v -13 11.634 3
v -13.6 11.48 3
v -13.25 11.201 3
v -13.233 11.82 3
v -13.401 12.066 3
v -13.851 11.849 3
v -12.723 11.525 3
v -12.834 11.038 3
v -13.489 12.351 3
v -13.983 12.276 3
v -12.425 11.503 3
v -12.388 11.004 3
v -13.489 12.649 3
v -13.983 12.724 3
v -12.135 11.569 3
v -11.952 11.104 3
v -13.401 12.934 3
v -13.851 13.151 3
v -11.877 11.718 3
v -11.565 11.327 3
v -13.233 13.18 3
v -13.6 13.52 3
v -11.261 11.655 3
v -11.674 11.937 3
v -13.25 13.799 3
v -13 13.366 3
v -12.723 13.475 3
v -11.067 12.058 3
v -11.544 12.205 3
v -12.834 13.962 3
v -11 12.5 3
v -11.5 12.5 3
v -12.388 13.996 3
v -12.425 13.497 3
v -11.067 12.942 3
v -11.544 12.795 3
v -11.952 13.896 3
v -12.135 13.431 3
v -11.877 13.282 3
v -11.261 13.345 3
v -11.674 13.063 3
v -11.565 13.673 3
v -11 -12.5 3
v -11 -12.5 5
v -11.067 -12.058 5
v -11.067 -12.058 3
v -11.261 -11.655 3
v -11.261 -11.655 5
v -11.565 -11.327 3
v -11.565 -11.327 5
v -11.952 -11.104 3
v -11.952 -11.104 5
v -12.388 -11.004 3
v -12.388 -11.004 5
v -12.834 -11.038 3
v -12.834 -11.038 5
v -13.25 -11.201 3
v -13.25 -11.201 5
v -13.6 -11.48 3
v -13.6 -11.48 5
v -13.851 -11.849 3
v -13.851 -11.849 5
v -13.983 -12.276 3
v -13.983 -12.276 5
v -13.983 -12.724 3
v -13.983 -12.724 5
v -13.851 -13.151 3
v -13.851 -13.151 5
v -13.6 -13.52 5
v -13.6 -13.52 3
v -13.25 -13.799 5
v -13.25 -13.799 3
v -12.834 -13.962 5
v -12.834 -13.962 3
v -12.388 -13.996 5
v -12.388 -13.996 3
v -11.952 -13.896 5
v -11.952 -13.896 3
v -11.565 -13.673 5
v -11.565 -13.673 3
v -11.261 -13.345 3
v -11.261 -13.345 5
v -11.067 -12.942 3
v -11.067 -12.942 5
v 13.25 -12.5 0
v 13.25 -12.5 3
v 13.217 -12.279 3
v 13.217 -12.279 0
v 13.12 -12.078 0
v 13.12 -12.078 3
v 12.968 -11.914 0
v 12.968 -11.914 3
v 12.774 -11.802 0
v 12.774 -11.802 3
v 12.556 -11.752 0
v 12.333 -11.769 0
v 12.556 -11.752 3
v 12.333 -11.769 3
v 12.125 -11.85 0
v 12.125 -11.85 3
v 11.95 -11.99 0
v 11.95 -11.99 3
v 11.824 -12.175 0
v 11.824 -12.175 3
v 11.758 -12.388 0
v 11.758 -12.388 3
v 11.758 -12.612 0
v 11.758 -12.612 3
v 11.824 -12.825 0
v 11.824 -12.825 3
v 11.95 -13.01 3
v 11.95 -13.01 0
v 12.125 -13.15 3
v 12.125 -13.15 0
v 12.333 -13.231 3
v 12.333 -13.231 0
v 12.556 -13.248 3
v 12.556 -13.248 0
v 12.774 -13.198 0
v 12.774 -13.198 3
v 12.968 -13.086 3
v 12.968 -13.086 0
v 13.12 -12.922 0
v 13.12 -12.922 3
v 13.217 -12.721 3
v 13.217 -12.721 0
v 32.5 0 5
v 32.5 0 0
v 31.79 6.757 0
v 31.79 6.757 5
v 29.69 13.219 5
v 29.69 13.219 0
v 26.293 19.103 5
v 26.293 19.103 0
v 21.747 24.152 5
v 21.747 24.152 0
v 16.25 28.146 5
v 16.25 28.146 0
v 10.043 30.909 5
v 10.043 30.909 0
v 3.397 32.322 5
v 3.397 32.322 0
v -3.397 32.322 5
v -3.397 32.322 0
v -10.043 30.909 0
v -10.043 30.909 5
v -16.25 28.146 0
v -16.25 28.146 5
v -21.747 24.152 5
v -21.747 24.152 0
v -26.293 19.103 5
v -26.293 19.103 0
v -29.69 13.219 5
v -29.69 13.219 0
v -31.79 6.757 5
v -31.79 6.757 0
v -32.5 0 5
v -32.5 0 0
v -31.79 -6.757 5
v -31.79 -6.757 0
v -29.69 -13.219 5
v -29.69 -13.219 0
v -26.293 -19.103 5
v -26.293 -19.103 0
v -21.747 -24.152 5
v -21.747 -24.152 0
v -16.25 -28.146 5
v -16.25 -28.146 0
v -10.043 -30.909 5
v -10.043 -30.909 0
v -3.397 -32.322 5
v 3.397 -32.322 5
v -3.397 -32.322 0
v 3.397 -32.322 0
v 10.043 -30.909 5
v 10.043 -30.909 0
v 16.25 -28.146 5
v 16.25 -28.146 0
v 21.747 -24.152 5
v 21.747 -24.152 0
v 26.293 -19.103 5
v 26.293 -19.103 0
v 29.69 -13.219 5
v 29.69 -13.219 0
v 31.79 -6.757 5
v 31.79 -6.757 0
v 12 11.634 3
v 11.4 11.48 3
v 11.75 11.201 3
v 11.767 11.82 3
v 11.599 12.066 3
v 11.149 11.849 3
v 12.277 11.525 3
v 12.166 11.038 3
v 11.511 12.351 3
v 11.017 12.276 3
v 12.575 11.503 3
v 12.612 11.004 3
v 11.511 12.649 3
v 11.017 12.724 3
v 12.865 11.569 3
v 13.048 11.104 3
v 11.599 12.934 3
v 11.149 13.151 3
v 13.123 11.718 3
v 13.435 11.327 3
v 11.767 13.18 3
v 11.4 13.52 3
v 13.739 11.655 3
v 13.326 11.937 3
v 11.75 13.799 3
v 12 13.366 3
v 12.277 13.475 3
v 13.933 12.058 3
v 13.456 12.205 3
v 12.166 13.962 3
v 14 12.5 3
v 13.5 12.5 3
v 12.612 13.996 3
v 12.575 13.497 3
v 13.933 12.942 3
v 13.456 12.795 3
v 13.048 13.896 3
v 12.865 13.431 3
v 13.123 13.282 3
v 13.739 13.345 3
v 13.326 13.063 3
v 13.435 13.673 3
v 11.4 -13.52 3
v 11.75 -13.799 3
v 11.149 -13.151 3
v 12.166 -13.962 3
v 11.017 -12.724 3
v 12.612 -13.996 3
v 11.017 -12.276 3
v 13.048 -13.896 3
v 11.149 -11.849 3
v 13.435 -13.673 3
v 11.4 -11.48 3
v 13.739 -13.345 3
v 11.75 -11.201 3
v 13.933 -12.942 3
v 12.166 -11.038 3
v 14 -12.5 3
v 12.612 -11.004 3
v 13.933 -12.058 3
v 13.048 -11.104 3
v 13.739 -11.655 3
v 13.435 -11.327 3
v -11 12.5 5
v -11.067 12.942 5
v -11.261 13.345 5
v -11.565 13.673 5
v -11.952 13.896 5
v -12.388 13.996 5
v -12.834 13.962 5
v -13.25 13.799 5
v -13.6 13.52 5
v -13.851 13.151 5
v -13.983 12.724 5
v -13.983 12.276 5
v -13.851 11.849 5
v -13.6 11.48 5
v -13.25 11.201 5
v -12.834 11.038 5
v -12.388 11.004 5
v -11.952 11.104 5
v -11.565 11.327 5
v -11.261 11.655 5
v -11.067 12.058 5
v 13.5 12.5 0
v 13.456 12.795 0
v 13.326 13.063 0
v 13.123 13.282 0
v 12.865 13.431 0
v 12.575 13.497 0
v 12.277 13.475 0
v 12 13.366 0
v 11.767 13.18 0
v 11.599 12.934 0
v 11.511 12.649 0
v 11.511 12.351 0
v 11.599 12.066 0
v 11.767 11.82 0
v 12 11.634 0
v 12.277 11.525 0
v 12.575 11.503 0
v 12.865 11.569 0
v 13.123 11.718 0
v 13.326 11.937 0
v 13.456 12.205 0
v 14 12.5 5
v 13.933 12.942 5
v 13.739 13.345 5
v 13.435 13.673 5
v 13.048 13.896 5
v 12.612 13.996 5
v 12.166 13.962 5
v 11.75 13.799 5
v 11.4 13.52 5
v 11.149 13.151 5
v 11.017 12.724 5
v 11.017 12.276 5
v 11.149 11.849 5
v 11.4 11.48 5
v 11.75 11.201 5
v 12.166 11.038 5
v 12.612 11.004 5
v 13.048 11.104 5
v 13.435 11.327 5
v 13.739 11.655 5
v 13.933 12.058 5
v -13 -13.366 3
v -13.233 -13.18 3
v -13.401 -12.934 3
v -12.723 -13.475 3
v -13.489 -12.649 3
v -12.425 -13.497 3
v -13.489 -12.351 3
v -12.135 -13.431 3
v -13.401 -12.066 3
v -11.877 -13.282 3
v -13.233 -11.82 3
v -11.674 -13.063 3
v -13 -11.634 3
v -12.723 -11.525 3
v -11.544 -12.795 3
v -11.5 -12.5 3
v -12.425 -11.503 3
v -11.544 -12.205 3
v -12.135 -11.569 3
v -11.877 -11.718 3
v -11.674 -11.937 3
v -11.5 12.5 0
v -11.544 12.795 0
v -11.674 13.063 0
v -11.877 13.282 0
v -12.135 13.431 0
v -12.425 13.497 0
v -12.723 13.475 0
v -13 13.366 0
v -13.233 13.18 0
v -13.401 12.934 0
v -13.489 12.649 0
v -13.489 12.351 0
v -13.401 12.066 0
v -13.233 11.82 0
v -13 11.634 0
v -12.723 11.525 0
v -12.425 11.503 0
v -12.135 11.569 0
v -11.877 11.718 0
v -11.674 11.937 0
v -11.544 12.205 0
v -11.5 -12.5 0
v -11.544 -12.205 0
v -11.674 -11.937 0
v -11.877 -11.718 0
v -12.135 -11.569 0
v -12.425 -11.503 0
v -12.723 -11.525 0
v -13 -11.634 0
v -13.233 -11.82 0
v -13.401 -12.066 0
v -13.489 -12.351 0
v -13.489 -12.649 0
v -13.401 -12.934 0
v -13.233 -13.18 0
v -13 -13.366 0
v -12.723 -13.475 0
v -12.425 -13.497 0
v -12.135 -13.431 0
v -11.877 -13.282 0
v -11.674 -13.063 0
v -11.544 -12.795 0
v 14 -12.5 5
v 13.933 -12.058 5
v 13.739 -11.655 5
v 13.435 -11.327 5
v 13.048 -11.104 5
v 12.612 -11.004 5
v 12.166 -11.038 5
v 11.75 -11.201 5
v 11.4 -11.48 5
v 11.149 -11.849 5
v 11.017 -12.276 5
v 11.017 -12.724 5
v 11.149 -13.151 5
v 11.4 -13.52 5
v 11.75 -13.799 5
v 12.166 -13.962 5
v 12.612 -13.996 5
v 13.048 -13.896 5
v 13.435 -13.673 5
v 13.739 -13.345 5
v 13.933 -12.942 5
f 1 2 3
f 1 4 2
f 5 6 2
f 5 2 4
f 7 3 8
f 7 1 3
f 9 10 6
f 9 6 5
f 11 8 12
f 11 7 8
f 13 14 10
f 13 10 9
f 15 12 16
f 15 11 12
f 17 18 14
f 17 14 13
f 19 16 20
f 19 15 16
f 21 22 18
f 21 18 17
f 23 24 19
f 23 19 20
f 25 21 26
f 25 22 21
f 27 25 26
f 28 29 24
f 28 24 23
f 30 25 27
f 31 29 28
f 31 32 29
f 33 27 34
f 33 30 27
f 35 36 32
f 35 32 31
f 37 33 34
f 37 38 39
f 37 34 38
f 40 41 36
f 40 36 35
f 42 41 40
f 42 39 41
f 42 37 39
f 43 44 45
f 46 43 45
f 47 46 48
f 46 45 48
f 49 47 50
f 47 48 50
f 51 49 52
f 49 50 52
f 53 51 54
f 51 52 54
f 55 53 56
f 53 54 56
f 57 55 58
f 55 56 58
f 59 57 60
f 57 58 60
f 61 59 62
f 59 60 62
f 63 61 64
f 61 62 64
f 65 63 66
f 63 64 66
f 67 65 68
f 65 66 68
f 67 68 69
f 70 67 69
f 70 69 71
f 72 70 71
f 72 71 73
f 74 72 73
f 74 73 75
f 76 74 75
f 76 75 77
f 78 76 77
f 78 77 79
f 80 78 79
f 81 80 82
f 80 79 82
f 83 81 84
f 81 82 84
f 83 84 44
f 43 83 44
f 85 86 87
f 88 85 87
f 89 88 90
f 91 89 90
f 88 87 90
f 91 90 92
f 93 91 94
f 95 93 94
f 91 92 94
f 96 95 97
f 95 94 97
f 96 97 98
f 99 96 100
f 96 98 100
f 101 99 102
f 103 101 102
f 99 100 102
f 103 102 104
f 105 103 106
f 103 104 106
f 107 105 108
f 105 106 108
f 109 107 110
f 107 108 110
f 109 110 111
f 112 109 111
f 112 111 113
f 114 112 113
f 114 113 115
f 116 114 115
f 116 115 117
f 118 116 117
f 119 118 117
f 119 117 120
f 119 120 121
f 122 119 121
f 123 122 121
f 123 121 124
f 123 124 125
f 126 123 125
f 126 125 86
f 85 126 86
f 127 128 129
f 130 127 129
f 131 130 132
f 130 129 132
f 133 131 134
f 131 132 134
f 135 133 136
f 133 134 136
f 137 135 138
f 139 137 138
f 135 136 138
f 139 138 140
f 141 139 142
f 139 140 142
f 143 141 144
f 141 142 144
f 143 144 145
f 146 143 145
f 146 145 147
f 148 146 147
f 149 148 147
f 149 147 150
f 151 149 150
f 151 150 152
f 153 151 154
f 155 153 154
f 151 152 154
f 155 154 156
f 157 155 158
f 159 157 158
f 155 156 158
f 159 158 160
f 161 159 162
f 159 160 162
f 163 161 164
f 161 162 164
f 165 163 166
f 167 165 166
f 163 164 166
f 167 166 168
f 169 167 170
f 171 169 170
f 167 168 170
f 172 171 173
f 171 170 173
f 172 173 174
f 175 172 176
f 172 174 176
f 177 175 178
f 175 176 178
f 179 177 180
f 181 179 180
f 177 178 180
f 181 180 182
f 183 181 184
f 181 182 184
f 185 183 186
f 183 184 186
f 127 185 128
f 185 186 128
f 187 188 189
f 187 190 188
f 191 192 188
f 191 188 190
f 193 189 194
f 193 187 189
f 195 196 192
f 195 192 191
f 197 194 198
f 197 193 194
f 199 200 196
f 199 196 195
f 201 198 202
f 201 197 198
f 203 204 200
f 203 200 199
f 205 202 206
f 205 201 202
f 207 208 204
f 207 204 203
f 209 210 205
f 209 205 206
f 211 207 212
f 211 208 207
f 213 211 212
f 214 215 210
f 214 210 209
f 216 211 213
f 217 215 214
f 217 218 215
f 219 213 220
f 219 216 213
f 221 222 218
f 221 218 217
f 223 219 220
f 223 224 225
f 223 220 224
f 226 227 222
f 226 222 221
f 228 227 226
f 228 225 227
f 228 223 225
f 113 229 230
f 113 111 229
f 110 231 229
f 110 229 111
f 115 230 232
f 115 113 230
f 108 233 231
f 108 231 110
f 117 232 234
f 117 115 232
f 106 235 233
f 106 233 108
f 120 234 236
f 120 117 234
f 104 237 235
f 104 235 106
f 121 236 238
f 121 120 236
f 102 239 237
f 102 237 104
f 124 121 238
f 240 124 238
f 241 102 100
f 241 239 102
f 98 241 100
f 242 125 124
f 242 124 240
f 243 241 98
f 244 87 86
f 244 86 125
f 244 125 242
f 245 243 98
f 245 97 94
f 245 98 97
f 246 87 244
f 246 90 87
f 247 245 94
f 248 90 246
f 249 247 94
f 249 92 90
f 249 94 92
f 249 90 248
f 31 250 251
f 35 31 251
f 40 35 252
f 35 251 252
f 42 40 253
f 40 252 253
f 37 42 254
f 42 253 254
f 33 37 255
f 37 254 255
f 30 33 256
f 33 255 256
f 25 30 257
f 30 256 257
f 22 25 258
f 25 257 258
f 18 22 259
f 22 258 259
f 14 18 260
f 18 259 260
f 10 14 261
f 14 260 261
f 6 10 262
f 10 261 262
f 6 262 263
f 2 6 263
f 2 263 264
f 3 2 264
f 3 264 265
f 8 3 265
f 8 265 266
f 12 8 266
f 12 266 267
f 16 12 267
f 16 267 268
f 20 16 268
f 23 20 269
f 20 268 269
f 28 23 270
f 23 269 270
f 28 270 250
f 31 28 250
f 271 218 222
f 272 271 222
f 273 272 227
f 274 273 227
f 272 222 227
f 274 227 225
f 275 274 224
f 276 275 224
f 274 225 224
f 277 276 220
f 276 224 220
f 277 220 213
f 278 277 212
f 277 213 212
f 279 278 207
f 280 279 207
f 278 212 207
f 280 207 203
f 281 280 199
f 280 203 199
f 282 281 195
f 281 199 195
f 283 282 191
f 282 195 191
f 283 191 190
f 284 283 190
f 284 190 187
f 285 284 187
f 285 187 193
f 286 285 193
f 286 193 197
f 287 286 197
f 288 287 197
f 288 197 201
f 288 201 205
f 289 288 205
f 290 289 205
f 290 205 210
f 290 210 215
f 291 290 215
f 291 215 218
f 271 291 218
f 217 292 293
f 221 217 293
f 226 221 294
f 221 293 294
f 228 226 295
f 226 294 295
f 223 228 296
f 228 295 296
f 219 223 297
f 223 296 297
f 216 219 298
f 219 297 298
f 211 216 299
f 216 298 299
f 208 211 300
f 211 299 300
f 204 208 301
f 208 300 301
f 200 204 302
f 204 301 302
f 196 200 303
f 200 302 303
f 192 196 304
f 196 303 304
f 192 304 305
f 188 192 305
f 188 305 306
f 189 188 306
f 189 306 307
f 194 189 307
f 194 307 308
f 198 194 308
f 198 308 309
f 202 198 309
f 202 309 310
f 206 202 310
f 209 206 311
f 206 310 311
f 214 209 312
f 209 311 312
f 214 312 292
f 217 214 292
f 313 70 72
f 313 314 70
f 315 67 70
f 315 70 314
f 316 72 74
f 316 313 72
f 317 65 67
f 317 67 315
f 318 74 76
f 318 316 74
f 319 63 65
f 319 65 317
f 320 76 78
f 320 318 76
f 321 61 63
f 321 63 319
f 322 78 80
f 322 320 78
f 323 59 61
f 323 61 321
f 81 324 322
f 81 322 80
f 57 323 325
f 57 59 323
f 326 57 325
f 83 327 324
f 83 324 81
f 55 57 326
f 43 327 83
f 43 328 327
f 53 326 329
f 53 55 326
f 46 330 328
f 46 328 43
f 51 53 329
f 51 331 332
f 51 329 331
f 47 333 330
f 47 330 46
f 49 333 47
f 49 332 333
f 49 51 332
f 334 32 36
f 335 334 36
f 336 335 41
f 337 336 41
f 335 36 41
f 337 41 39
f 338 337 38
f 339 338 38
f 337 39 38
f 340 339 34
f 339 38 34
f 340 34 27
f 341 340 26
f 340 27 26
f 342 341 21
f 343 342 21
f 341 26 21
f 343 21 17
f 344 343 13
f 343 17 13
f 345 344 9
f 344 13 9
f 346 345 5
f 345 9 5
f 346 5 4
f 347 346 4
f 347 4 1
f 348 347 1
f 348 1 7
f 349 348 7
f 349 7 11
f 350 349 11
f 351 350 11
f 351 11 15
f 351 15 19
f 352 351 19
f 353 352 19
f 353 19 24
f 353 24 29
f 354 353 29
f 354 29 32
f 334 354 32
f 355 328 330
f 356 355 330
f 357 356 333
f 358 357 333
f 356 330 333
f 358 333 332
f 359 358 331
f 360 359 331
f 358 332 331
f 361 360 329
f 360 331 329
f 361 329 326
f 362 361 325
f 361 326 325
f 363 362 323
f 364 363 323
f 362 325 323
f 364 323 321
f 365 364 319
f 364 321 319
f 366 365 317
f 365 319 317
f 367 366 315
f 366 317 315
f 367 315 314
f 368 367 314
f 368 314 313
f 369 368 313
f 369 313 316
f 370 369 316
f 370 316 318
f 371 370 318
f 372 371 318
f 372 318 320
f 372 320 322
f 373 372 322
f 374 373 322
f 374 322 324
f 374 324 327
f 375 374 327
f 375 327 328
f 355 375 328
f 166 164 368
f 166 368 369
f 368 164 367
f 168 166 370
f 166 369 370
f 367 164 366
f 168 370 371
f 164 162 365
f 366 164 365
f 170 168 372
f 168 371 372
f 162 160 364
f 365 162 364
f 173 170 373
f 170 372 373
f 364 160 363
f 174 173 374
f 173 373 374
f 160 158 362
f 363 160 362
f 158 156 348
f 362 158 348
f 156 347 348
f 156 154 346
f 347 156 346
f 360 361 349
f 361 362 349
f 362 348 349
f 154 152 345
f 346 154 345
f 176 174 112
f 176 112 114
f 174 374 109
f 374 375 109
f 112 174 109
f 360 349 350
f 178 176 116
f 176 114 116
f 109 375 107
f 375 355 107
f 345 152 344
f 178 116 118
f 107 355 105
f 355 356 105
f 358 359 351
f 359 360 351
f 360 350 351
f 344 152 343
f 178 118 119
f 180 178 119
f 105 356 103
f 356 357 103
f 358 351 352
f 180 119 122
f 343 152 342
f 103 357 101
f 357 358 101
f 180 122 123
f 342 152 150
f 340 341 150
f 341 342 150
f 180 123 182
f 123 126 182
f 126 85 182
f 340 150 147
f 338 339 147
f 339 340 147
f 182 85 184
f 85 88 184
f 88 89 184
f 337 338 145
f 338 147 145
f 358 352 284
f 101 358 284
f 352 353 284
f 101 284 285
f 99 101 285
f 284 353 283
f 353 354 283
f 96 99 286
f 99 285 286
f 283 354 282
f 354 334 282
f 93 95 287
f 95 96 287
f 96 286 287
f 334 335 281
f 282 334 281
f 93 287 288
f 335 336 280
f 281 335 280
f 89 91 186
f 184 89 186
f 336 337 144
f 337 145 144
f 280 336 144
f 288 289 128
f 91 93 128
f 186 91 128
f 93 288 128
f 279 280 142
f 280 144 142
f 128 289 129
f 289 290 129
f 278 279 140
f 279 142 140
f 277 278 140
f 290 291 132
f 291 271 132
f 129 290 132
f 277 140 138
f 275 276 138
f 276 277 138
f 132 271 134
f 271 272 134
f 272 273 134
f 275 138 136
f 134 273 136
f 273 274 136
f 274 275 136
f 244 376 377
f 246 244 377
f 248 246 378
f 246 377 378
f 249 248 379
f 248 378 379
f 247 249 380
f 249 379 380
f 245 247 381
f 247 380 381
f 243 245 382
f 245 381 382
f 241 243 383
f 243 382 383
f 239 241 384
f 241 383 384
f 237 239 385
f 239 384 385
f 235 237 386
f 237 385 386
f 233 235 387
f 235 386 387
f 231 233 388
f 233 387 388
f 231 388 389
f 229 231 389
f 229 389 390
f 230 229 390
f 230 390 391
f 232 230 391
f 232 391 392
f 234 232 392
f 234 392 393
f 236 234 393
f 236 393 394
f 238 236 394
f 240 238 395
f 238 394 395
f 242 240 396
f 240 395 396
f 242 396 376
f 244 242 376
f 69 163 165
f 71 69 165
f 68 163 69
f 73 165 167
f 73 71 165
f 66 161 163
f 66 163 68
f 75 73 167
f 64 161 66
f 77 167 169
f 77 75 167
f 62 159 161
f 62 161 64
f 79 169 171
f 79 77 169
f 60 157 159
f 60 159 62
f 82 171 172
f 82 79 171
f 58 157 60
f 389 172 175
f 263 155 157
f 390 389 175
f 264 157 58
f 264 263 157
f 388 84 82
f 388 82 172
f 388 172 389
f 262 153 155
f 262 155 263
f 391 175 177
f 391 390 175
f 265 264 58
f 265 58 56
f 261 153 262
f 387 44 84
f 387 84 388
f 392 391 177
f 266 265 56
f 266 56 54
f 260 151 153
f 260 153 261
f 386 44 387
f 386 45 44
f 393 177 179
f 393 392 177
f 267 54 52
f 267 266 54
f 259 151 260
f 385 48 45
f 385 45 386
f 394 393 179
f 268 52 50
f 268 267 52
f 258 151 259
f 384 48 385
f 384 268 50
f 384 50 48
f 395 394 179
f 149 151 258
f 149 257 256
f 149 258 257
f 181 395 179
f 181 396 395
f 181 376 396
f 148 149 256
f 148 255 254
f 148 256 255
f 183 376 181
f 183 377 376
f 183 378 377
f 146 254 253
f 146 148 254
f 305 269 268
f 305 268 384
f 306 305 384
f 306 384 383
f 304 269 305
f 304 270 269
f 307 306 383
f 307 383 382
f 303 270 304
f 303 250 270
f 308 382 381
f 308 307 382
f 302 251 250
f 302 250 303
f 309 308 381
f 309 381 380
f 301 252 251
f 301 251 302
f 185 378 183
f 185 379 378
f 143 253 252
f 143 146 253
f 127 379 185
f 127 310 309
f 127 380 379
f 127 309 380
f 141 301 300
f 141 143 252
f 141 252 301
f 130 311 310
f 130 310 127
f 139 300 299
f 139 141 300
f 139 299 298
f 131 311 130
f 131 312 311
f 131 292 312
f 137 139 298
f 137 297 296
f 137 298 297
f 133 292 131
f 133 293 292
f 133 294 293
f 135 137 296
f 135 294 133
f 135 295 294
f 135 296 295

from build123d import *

# Parameters (mm, degrees)
F0_R     = 32.5
F1_DEPTH = 5
F4_R     = 0.75
F4_R_2   = 1
F5_DEPTH = 5
F3_R     = 1.5
F6_DEPTH = 2


with BuildPart() as f1:
    # F0 (on Top) → F1 (new body)
    with BuildSketch(Plane.XY):
        Circle(F0_R)
    extrude(amount=F1_DEPTH)

    # F4 (on face) → F5 (cut)
    with BuildSketch(Plane.XY.offset(5)):
        with Locations((12.5, -12.5)):
            Circle(F4_R)
        with Locations((-12.5, 12.5)):
            Circle(F4_R_2)
        with Locations((-12.5, -12.5)):
            Circle(F4_R_2)
        with Locations((12.5, 12.5)):
            Circle(F4_R_2)
    extrude(amount=-F5_DEPTH, mode=Mode.SUBTRACT)

    # F3 (on face) → F6 (cut)
    with BuildSketch(Plane.XY.offset(5)):
        with Locations((12.5, 12.5)):
            Circle(F3_R)
        with Locations((12.5, -12.5)):
            Circle(F3_R)
        with Locations((-12.5, -12.5)):
            Circle(F3_R)
        with Locations((-12.5, 12.5)):
            Circle(F3_R)
    extrude(amount=-F6_DEPTH, mode=Mode.SUBTRACT)


solid = f1.part
